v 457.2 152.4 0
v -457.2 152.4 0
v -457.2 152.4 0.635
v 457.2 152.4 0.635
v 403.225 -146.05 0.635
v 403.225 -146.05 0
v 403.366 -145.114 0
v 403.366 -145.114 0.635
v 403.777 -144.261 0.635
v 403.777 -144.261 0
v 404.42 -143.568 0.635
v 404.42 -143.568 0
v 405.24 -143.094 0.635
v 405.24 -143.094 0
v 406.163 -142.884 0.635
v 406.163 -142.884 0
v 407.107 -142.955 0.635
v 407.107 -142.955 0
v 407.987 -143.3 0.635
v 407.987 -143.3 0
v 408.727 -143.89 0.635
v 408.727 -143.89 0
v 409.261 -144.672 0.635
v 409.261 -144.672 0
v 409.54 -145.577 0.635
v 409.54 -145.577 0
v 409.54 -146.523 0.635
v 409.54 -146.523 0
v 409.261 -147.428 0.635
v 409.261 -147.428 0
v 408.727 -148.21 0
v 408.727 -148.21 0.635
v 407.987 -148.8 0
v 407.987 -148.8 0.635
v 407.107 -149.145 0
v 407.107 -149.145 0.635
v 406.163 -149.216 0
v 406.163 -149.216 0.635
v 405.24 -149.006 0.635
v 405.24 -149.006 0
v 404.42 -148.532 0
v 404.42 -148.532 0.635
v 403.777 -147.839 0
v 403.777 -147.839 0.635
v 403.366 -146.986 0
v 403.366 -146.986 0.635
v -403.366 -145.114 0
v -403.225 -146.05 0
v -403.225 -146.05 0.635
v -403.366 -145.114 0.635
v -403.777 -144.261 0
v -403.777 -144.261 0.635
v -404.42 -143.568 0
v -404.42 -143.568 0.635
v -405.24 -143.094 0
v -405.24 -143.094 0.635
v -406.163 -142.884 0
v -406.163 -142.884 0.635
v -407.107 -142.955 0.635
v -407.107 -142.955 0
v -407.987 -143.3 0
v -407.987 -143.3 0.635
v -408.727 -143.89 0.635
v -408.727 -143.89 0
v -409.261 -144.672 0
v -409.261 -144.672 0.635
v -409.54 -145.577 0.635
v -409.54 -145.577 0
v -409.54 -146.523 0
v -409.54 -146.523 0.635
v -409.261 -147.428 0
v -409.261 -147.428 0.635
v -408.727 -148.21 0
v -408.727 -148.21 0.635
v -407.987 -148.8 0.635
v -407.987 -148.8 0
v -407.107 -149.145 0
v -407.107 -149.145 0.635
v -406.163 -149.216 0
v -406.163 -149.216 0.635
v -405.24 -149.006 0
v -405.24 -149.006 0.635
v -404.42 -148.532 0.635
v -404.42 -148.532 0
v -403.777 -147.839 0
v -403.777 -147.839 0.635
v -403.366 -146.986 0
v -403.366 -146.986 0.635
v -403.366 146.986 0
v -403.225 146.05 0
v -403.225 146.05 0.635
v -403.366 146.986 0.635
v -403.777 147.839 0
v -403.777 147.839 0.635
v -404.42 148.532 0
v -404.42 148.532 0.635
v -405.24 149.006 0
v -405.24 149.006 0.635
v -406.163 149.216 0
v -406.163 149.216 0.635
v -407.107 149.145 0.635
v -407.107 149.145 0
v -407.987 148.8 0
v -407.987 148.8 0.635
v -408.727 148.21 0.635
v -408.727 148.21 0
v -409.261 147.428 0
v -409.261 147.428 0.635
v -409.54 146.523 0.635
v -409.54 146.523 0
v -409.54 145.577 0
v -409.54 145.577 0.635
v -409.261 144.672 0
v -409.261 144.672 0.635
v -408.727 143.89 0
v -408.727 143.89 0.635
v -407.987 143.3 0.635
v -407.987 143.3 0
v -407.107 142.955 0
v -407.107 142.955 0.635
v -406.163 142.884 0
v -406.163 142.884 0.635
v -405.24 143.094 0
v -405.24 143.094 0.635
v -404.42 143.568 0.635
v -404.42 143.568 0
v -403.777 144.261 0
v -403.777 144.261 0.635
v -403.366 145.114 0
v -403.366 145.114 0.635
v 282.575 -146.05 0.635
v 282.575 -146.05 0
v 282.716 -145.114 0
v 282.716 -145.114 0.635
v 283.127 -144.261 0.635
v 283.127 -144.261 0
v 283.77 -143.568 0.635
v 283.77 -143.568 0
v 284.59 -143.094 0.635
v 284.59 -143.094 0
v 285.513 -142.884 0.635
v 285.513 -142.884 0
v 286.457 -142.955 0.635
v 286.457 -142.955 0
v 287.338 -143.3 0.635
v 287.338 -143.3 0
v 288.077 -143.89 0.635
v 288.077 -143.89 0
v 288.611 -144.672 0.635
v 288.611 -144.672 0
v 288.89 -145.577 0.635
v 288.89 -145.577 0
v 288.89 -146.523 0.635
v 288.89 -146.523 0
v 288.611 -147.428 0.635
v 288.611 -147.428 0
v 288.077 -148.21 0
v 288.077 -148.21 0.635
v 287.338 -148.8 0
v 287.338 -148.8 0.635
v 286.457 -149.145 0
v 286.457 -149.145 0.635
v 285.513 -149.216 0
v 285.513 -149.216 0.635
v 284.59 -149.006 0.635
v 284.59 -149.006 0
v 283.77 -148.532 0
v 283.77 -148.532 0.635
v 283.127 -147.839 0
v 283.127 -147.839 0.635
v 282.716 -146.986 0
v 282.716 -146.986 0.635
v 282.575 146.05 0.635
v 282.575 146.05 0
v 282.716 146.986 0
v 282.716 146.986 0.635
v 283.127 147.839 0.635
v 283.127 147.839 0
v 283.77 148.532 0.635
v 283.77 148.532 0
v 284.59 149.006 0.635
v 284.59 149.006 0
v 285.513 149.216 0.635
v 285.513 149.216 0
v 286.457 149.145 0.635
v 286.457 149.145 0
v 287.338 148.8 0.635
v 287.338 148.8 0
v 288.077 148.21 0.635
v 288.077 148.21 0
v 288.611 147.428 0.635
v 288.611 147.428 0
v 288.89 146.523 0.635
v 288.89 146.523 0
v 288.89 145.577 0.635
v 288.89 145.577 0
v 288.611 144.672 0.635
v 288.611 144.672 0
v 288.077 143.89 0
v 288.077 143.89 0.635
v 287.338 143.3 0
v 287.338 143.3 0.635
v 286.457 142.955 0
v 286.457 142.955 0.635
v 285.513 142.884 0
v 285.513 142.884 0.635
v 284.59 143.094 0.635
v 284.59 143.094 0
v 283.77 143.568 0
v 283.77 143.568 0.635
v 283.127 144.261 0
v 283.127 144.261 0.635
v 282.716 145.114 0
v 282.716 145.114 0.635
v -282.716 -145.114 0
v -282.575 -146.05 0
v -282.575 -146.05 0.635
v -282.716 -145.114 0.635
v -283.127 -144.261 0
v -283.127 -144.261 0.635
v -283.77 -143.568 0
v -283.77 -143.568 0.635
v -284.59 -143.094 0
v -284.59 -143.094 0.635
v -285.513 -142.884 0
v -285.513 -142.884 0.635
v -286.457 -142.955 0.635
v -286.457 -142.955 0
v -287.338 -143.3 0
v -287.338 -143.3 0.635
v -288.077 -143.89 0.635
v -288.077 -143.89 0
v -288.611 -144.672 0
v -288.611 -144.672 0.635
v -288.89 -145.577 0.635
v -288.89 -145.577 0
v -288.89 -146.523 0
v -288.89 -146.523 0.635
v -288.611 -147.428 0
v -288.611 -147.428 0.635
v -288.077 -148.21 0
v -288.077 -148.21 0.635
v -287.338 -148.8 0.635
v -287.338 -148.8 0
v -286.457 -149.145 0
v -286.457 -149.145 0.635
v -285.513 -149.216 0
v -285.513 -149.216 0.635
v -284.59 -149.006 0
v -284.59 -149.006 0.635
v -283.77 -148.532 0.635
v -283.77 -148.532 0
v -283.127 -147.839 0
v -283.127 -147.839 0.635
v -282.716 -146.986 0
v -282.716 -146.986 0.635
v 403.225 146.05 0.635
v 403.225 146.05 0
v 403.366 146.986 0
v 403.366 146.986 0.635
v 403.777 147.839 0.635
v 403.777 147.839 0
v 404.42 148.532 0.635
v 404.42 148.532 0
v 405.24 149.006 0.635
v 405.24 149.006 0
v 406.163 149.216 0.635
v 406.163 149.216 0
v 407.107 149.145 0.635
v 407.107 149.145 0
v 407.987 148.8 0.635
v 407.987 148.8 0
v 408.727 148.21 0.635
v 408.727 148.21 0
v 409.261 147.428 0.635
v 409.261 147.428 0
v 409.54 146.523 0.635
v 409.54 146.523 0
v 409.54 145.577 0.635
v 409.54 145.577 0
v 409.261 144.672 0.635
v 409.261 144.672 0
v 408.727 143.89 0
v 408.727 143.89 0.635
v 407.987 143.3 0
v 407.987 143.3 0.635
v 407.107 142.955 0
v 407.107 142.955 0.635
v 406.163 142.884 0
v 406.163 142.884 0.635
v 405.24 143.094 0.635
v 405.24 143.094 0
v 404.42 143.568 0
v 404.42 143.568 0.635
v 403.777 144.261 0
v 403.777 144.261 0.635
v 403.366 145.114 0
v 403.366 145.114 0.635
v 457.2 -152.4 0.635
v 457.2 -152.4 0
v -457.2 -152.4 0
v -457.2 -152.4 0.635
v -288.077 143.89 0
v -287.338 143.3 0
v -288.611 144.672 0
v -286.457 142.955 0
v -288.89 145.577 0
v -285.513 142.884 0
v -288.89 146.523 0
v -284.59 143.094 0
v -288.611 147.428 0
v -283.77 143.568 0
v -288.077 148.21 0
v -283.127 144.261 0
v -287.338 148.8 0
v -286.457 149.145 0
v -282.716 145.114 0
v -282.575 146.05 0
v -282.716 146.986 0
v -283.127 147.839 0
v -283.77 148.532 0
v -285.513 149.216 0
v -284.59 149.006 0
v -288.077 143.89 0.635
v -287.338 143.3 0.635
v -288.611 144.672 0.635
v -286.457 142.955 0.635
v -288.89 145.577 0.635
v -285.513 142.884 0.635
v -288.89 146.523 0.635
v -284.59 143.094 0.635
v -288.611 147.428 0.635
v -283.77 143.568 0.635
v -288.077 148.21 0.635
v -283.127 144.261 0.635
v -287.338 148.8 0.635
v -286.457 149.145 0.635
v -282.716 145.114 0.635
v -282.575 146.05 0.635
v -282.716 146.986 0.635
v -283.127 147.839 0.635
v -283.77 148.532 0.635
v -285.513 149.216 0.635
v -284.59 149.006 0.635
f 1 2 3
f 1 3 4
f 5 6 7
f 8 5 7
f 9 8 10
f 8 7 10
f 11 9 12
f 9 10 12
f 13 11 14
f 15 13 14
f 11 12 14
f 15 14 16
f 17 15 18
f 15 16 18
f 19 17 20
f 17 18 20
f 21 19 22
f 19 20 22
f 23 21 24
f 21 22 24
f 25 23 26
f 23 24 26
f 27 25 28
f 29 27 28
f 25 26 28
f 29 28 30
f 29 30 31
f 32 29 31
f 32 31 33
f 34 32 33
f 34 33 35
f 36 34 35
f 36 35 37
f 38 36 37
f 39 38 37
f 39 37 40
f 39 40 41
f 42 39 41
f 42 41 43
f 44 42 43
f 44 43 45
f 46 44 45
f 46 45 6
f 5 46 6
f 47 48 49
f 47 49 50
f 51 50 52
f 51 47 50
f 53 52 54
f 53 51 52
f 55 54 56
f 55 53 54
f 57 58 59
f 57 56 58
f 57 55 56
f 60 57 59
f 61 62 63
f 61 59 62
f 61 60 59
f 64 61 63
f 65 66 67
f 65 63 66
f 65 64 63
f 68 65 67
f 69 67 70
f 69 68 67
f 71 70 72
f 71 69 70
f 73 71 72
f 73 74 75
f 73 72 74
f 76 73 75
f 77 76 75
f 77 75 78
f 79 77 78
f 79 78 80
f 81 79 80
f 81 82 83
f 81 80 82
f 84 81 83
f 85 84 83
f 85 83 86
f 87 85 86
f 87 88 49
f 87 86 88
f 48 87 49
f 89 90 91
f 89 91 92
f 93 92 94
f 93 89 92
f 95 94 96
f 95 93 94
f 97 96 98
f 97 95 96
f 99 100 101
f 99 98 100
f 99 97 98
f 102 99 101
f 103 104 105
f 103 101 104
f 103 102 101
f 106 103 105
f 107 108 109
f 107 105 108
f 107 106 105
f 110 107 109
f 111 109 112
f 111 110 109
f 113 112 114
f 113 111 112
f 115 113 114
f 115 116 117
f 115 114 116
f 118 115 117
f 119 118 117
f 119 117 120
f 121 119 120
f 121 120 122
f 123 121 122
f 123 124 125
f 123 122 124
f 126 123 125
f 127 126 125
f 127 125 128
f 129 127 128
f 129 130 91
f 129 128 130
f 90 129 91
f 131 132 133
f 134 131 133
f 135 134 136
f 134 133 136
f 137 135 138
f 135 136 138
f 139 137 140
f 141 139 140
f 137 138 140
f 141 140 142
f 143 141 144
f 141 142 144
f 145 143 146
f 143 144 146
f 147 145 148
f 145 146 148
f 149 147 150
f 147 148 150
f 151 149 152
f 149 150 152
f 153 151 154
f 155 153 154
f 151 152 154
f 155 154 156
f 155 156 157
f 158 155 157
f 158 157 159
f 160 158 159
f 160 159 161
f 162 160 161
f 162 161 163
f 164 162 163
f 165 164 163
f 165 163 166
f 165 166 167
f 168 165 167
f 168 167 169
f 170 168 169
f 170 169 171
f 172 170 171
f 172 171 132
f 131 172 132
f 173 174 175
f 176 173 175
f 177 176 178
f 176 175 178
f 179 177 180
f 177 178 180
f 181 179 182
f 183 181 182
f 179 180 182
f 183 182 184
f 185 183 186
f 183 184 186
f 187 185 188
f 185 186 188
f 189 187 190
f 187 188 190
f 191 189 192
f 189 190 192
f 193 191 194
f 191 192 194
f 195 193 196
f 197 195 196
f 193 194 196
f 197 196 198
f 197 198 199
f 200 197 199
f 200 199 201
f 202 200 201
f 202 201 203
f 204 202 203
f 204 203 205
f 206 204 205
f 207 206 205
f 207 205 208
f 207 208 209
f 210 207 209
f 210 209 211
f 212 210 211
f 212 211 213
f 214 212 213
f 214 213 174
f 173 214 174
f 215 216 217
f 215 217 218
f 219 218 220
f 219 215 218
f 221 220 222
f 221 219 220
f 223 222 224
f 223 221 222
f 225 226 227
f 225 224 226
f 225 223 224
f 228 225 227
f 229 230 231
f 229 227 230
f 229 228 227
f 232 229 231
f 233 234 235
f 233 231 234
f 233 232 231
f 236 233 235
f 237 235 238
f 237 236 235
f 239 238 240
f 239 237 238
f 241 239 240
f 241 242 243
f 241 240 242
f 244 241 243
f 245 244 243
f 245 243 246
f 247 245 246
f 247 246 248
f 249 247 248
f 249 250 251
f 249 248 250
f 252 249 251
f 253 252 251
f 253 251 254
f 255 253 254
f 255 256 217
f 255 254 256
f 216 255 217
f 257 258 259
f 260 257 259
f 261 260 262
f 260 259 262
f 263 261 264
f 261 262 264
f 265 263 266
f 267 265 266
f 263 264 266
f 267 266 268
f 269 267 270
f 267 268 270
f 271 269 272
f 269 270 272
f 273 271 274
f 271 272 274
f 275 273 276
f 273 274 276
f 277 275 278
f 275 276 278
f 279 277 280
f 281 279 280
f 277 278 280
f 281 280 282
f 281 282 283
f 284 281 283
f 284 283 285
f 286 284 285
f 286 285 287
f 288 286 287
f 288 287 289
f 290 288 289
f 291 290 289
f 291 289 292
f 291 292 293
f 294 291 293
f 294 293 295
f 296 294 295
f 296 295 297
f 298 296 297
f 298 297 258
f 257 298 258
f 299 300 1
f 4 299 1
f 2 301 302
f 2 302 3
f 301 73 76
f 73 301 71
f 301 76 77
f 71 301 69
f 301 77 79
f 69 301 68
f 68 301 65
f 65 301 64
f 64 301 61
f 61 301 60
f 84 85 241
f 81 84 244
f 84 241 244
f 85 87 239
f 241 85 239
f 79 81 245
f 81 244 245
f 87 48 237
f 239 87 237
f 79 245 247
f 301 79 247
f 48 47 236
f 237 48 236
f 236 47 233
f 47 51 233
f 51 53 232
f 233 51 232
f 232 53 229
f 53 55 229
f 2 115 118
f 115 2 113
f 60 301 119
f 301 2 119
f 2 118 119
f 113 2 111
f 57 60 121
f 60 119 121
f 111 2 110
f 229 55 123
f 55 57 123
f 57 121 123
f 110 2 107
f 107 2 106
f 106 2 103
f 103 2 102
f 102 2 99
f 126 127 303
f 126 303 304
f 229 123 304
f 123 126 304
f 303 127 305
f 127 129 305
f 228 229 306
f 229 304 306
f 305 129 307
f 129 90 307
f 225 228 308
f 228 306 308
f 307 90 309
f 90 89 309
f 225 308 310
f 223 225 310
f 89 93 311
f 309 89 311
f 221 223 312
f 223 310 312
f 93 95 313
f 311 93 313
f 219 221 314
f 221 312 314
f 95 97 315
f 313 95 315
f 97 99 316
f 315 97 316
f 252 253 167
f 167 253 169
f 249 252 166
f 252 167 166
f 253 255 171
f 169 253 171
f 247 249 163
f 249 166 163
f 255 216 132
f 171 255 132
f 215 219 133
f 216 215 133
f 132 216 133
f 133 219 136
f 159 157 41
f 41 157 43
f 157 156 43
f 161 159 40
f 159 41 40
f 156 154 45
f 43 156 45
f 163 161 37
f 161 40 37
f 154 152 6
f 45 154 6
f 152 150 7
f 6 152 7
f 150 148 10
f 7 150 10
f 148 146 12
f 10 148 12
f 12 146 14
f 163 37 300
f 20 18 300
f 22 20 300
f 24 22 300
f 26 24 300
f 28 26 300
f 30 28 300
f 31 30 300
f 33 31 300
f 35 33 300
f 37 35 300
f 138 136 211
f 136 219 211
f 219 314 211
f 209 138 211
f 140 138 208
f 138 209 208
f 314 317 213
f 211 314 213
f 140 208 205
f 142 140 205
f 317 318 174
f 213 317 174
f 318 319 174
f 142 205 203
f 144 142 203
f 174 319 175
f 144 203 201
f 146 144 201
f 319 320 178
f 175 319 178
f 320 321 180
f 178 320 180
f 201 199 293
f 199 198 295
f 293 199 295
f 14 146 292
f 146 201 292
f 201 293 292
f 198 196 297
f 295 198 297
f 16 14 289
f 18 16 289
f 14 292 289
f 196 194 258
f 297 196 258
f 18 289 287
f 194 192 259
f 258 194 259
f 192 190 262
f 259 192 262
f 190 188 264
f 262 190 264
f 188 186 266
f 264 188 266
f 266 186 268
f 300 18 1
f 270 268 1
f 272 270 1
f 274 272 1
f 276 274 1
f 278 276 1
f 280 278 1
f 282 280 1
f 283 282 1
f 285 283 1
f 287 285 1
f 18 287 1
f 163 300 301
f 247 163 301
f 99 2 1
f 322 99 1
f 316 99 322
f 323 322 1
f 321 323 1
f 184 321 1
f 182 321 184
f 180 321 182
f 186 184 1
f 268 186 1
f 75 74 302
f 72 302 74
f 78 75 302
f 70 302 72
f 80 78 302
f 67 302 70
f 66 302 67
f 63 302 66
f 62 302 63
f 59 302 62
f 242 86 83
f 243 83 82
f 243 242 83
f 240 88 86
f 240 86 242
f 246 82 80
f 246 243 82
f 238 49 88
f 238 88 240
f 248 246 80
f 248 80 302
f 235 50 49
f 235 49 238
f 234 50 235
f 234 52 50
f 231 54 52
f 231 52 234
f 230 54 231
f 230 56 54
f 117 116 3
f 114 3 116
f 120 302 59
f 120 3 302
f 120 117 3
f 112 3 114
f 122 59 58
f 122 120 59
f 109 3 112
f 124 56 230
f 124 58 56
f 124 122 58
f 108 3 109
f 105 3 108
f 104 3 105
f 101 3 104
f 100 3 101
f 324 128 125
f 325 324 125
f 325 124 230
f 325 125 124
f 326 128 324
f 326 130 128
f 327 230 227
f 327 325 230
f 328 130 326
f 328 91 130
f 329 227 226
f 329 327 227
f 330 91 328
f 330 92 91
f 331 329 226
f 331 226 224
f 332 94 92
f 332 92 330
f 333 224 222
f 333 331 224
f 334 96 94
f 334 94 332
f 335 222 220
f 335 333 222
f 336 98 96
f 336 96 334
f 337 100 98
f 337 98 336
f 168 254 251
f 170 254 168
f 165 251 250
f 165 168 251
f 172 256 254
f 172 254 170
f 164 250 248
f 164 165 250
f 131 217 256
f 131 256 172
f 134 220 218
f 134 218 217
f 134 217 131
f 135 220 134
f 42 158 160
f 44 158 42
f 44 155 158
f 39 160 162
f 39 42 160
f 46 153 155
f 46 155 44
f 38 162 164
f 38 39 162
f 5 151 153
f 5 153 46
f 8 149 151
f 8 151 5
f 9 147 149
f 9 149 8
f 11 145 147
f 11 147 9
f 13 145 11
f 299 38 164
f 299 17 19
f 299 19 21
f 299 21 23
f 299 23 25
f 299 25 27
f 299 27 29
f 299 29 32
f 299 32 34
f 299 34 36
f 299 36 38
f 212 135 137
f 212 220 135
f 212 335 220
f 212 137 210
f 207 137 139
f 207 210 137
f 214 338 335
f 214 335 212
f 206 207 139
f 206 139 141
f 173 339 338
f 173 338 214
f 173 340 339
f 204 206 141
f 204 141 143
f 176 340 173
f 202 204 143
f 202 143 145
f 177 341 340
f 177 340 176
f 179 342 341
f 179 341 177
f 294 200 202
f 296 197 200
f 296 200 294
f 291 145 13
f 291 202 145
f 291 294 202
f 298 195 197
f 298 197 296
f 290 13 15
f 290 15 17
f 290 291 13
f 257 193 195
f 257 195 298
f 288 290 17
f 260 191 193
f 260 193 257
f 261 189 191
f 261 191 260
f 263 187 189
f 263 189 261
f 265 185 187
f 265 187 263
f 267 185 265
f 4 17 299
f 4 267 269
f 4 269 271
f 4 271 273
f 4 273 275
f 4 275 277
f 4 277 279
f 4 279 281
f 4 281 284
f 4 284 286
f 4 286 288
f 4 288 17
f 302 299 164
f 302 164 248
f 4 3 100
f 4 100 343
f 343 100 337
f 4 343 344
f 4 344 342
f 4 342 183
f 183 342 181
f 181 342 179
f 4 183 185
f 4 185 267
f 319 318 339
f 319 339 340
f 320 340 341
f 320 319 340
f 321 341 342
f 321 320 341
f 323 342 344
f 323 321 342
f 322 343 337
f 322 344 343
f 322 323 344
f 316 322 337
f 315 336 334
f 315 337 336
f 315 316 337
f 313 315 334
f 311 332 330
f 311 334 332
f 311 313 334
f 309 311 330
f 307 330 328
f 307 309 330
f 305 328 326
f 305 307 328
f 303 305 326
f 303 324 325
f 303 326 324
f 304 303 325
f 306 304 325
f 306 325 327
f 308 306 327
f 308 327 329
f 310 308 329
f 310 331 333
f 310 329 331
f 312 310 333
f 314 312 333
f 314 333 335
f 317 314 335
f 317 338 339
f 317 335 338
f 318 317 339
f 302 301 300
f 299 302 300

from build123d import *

# Parameters (mm, degrees)
SKETCH1_W                   = 914.4
SKETCH1_H                   = 304.8
BOSS_EXTRUDE1_DEPTH         = 0.635
F_1_4_0_25_DIAMETER_HOLE1_D = 6.35


with BuildPart() as part:
    # Sketch1 → Boss-Extrude1 (new body)
    with BuildSketch(Plane.XY):
        Rectangle(SKETCH1_W, SKETCH1_H)
    extrude(amount=BOSS_EXTRUDE1_DEPTH)

    # 1/4 (0.25) Diameter Hole1 (through all)
    with Locations(Plane.XY.offset(0.635)):
        with Locations((285.75, 146.05), (406.4, 146.05), (406.4, -146.05), (285.75, -146.05)):
            f_1_4_0_25_diameter_hole1 = Hole(F_1_4_0_25_DIAMETER_HOLE1_D / 2)

    # Mirror1: 1/4 (0.25) Diameter Hole1 across plane
    add(f_1_4_0_25_diameter_hole1.mirror(Plane(origin=(0, 0, 0), x_dir=(0, 0, 1), z_dir=(1, 0, 0))), mode=Mode.SUBTRACT)


solid = part.part
